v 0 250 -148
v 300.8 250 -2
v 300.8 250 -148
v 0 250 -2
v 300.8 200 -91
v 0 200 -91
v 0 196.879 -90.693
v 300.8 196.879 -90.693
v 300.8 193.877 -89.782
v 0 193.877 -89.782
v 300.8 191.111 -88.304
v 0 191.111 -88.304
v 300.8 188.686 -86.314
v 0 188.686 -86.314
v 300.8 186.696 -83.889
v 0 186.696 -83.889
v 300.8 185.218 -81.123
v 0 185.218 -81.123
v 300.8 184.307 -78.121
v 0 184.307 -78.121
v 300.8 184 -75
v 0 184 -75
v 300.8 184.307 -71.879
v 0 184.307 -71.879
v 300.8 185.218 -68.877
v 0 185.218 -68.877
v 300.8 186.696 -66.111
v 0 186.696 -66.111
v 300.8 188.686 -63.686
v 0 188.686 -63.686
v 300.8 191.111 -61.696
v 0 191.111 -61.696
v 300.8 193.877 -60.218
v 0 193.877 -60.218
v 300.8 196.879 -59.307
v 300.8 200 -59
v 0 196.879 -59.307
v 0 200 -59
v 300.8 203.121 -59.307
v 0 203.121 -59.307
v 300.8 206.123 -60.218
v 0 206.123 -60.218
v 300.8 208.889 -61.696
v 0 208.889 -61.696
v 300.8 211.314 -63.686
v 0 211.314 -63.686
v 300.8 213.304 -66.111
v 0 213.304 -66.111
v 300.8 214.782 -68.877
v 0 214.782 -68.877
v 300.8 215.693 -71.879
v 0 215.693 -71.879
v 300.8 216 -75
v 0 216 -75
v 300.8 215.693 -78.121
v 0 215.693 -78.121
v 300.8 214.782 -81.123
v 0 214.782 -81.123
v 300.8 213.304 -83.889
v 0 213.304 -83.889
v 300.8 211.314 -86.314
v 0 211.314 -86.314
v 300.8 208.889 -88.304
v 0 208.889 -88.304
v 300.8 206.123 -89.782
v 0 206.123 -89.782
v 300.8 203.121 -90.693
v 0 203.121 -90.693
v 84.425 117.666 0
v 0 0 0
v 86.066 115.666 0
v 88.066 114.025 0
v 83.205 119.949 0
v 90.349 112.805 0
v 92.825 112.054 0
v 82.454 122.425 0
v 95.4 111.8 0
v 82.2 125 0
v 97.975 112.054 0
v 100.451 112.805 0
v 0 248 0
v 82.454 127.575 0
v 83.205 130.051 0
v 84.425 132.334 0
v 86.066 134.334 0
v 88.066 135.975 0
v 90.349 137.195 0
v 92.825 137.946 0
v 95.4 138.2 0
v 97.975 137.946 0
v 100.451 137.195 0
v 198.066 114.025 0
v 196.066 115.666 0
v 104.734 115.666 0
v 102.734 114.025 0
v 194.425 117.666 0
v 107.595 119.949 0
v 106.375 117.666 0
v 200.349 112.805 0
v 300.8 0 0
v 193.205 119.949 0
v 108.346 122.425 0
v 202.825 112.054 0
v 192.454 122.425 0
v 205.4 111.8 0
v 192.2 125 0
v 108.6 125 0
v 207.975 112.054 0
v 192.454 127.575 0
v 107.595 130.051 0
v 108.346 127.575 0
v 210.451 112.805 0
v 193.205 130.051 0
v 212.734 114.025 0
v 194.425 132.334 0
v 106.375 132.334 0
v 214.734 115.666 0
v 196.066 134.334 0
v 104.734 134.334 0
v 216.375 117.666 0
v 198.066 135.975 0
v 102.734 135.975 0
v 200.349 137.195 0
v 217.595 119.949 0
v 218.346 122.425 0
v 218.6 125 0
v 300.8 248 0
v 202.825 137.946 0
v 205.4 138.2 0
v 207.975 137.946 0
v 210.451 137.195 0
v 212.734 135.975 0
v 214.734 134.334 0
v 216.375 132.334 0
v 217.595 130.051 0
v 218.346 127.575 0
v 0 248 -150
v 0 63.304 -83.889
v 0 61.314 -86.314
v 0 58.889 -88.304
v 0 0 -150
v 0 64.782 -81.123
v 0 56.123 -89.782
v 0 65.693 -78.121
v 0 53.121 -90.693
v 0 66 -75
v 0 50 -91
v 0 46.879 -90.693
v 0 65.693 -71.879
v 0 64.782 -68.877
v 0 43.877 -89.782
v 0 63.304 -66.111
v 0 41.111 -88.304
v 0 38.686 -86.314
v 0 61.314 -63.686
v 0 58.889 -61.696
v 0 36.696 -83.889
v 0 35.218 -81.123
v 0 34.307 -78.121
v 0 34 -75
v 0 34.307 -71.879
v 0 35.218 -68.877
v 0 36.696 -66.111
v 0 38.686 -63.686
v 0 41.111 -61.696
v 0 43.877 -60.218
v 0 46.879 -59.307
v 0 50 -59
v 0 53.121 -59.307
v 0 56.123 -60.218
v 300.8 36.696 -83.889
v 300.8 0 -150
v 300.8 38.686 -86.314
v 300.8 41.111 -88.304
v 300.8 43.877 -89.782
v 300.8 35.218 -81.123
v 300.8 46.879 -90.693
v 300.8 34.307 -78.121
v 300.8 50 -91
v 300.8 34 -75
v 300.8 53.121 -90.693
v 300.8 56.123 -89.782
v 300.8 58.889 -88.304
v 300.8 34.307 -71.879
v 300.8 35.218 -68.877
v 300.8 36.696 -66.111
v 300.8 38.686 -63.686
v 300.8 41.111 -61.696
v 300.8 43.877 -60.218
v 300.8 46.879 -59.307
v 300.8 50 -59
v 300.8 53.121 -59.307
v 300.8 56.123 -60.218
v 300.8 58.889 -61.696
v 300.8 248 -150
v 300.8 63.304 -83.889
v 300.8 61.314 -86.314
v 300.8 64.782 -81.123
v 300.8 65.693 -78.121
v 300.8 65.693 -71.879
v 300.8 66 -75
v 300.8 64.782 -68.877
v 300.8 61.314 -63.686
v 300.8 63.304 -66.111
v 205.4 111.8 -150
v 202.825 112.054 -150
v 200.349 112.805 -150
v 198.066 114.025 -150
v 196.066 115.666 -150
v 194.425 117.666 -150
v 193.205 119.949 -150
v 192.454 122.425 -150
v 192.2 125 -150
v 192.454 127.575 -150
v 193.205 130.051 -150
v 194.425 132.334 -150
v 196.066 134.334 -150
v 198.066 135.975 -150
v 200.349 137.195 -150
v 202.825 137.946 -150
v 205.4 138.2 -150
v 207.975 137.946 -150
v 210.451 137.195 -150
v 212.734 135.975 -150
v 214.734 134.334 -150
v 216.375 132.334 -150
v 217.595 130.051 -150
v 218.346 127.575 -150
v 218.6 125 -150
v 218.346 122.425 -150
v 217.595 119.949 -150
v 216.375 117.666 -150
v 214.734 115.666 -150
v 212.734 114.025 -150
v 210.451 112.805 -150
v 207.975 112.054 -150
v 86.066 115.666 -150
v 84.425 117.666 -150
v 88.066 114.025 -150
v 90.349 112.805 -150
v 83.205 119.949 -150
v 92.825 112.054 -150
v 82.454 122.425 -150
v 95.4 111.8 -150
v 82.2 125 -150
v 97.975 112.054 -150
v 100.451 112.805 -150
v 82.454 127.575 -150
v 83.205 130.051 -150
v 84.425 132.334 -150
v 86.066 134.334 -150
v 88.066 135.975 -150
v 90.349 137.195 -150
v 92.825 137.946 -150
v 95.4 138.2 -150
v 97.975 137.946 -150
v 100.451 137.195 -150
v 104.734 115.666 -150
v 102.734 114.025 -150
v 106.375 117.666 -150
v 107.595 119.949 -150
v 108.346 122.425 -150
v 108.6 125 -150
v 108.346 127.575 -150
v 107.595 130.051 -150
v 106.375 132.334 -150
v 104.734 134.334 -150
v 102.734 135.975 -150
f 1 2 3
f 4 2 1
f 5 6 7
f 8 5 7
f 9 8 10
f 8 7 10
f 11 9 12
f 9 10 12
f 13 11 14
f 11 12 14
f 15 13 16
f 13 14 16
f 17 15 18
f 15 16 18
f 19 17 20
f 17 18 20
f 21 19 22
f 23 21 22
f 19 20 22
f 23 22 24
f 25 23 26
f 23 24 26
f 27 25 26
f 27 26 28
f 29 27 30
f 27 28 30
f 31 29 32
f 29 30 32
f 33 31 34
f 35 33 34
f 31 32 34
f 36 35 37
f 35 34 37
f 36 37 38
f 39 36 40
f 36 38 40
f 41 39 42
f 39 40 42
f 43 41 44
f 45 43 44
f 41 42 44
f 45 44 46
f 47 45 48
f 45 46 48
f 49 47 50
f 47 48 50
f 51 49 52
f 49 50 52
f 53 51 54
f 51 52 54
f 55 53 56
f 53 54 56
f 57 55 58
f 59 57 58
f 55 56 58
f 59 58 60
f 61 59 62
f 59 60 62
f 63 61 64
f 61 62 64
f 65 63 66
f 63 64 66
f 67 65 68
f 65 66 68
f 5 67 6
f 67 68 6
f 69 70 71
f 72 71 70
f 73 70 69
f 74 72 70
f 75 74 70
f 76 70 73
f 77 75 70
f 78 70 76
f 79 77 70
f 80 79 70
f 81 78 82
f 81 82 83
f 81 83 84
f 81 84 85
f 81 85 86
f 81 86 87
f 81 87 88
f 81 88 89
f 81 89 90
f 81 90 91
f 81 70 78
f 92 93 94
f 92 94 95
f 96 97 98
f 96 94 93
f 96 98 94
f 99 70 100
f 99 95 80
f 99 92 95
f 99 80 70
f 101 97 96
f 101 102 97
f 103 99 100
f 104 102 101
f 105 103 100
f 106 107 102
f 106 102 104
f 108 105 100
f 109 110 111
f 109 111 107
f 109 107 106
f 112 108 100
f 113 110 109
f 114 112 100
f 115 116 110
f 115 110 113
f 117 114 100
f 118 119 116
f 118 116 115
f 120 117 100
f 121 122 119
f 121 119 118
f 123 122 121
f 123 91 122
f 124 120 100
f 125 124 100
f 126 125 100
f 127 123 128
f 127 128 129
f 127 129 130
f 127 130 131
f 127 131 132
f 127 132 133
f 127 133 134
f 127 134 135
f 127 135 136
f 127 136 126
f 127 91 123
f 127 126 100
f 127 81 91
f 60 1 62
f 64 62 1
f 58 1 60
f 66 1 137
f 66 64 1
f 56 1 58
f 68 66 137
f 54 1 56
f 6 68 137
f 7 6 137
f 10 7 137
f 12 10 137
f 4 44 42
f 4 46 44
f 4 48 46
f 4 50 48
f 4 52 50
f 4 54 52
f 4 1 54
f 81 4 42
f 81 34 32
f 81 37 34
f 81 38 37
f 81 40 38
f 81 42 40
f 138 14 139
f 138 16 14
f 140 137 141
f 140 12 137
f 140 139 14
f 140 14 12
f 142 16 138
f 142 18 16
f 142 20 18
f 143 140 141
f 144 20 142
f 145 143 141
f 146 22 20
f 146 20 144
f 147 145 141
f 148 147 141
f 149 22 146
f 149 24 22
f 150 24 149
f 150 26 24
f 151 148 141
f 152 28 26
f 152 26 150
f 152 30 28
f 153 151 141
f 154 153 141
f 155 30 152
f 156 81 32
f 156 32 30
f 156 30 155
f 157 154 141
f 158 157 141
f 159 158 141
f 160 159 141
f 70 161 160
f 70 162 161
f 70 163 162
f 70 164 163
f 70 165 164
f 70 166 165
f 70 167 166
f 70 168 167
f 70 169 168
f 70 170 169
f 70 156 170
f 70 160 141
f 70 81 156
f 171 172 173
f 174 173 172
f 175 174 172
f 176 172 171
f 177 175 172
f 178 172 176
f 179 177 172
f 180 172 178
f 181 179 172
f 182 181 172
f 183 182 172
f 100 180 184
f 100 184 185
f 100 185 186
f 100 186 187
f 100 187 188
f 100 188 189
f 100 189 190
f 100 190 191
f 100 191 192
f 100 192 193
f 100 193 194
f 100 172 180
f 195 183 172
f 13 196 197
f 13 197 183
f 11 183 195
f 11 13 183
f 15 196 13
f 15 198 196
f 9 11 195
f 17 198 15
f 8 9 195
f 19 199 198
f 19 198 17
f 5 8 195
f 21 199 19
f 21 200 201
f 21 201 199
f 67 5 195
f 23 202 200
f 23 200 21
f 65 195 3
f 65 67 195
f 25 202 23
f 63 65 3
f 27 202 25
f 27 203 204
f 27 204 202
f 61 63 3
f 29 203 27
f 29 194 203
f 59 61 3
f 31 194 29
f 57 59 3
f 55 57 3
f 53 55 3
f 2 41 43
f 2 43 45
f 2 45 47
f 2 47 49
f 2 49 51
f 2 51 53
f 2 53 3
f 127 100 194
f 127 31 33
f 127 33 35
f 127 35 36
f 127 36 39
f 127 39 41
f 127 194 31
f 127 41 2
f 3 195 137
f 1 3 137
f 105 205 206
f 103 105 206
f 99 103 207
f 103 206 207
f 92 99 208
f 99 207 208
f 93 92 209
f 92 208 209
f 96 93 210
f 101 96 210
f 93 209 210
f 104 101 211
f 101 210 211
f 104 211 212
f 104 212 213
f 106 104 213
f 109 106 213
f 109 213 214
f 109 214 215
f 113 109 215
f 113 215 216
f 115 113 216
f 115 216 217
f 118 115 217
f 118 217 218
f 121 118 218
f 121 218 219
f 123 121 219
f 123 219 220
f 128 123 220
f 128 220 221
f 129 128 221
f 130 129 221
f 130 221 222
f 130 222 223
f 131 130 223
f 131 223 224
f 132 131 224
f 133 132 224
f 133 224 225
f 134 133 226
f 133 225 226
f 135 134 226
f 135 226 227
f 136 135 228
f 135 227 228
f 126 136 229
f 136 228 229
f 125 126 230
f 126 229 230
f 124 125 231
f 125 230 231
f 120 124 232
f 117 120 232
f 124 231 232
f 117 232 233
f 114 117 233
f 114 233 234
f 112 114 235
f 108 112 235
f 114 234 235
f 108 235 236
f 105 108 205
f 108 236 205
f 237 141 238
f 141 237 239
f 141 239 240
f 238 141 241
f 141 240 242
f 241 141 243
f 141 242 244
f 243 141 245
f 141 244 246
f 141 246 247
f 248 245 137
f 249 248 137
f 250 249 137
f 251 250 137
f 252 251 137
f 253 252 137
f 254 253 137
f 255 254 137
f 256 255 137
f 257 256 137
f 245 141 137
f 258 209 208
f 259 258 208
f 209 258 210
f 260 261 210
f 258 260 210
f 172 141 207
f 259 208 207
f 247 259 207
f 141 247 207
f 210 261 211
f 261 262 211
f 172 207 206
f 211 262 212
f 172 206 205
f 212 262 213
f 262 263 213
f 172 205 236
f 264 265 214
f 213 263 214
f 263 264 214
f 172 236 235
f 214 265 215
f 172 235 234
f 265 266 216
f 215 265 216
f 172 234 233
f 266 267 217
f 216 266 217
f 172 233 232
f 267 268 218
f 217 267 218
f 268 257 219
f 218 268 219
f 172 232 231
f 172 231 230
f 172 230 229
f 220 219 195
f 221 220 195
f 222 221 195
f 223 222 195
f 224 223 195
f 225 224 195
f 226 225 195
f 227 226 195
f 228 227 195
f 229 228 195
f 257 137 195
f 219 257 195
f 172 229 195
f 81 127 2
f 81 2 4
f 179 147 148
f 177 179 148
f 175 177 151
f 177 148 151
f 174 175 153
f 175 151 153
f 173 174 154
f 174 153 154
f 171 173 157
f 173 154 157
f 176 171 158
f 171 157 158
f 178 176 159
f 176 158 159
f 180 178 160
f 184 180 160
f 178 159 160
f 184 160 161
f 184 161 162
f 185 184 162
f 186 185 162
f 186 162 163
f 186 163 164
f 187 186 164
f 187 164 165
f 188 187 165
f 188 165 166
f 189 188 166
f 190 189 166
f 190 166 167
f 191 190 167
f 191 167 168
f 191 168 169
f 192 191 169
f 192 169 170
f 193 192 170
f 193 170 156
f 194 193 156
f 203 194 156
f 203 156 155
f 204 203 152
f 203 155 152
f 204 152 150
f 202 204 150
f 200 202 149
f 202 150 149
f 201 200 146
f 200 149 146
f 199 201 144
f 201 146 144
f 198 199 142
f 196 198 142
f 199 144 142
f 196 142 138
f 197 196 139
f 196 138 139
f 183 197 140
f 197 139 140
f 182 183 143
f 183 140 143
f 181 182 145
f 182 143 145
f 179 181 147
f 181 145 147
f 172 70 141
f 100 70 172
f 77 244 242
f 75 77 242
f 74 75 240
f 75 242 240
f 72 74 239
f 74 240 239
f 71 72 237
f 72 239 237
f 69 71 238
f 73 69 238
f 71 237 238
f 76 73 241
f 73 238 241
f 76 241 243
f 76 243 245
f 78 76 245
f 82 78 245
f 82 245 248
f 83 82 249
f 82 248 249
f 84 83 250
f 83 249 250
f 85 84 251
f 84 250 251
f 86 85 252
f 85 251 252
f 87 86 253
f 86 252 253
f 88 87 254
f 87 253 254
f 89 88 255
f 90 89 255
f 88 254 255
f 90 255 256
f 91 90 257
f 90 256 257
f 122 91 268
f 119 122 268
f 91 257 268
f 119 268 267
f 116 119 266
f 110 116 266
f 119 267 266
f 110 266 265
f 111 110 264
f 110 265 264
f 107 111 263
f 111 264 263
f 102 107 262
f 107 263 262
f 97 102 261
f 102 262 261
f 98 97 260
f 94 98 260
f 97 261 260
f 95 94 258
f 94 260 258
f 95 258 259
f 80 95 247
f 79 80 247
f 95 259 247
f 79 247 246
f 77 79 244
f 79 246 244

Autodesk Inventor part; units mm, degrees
ref_plane "YZ Plane" through (0, 0, 0) normal (1, 0, 0) x (0, 1, 0)
ref_plane "XZ Plane" through (0, 0, 0) normal (0, 1, 0) x (-1, 0, 0)
ref_plane "XY Plane" through (0, 0, 0) normal (0, 0, 1) x (1, 0, 0)
sketch "Sketch1" plane through (0, 0, 0) normal (0, 0, 1) x (1, 0, 0)
  line L0 (0, 0) -> (300.8, 0)
  line L1 (300.8, 0) -> (300.8, 250)
  line L2 (300.8, 250) -> (0, 250)
  line L3 (0, 250) -> (0, 0)
  dimension "d0" = 300.8
  dimension "d1" = 250
extrude "Extrusion1" add sketch "Sketch1" against normal blind 150
sketch "Sketch2" plane through (300.8, 0, 0) normal (1, 0, 0) x (0, 0, -1)
  line L0 (0, 0) -> (0, 250) projected
  line L1 (0, 250) -> (150, 250) projected
  point P0 (75, 200)
  point P1 (75, 50)
  dimension "d4" = 75
  dimension "d5" = 75
  dimension "d6" = 150
  dimension "d7" = 50
hole "Hole1" at (300.8, 200, -75) at (300.8, 50, -75) direction (-1, 0, 0) diameter 32 end through all
sketch "Sketch3" plane through (0, 0, 0) normal (0, 0, 1) x (1, 0, 0)
  line L0 (0, 0) -> (300.8, 0) projected
  line L1 (300.8, 250) -> (0, 250) projected
  line L2 (0, 250) -> (0, 0) projected
  line L3 (300.8, 0) -> (300.8, 250) projected
  point P0 (95.4, 125)
  point P1 (205.4, 125)
  dimension "d16" = 125
  dimension "d17" = 125
  dimension "d31" = 110
  dimension "d32" = 95.4
hole "Hole2" at (95.4, 125, 0) at (205.4, 125, 0) direction (0, 0, -1) diameter 26.4 end through all
chamfer "Chamfer1" distance 2 angle 45 2 edges at (150.4, 250, -150) (150.4, 250, 0)
equation "\"d5\" = d4"
equation "\"d17\" = d16"
properties part number "Soporte mesa"
